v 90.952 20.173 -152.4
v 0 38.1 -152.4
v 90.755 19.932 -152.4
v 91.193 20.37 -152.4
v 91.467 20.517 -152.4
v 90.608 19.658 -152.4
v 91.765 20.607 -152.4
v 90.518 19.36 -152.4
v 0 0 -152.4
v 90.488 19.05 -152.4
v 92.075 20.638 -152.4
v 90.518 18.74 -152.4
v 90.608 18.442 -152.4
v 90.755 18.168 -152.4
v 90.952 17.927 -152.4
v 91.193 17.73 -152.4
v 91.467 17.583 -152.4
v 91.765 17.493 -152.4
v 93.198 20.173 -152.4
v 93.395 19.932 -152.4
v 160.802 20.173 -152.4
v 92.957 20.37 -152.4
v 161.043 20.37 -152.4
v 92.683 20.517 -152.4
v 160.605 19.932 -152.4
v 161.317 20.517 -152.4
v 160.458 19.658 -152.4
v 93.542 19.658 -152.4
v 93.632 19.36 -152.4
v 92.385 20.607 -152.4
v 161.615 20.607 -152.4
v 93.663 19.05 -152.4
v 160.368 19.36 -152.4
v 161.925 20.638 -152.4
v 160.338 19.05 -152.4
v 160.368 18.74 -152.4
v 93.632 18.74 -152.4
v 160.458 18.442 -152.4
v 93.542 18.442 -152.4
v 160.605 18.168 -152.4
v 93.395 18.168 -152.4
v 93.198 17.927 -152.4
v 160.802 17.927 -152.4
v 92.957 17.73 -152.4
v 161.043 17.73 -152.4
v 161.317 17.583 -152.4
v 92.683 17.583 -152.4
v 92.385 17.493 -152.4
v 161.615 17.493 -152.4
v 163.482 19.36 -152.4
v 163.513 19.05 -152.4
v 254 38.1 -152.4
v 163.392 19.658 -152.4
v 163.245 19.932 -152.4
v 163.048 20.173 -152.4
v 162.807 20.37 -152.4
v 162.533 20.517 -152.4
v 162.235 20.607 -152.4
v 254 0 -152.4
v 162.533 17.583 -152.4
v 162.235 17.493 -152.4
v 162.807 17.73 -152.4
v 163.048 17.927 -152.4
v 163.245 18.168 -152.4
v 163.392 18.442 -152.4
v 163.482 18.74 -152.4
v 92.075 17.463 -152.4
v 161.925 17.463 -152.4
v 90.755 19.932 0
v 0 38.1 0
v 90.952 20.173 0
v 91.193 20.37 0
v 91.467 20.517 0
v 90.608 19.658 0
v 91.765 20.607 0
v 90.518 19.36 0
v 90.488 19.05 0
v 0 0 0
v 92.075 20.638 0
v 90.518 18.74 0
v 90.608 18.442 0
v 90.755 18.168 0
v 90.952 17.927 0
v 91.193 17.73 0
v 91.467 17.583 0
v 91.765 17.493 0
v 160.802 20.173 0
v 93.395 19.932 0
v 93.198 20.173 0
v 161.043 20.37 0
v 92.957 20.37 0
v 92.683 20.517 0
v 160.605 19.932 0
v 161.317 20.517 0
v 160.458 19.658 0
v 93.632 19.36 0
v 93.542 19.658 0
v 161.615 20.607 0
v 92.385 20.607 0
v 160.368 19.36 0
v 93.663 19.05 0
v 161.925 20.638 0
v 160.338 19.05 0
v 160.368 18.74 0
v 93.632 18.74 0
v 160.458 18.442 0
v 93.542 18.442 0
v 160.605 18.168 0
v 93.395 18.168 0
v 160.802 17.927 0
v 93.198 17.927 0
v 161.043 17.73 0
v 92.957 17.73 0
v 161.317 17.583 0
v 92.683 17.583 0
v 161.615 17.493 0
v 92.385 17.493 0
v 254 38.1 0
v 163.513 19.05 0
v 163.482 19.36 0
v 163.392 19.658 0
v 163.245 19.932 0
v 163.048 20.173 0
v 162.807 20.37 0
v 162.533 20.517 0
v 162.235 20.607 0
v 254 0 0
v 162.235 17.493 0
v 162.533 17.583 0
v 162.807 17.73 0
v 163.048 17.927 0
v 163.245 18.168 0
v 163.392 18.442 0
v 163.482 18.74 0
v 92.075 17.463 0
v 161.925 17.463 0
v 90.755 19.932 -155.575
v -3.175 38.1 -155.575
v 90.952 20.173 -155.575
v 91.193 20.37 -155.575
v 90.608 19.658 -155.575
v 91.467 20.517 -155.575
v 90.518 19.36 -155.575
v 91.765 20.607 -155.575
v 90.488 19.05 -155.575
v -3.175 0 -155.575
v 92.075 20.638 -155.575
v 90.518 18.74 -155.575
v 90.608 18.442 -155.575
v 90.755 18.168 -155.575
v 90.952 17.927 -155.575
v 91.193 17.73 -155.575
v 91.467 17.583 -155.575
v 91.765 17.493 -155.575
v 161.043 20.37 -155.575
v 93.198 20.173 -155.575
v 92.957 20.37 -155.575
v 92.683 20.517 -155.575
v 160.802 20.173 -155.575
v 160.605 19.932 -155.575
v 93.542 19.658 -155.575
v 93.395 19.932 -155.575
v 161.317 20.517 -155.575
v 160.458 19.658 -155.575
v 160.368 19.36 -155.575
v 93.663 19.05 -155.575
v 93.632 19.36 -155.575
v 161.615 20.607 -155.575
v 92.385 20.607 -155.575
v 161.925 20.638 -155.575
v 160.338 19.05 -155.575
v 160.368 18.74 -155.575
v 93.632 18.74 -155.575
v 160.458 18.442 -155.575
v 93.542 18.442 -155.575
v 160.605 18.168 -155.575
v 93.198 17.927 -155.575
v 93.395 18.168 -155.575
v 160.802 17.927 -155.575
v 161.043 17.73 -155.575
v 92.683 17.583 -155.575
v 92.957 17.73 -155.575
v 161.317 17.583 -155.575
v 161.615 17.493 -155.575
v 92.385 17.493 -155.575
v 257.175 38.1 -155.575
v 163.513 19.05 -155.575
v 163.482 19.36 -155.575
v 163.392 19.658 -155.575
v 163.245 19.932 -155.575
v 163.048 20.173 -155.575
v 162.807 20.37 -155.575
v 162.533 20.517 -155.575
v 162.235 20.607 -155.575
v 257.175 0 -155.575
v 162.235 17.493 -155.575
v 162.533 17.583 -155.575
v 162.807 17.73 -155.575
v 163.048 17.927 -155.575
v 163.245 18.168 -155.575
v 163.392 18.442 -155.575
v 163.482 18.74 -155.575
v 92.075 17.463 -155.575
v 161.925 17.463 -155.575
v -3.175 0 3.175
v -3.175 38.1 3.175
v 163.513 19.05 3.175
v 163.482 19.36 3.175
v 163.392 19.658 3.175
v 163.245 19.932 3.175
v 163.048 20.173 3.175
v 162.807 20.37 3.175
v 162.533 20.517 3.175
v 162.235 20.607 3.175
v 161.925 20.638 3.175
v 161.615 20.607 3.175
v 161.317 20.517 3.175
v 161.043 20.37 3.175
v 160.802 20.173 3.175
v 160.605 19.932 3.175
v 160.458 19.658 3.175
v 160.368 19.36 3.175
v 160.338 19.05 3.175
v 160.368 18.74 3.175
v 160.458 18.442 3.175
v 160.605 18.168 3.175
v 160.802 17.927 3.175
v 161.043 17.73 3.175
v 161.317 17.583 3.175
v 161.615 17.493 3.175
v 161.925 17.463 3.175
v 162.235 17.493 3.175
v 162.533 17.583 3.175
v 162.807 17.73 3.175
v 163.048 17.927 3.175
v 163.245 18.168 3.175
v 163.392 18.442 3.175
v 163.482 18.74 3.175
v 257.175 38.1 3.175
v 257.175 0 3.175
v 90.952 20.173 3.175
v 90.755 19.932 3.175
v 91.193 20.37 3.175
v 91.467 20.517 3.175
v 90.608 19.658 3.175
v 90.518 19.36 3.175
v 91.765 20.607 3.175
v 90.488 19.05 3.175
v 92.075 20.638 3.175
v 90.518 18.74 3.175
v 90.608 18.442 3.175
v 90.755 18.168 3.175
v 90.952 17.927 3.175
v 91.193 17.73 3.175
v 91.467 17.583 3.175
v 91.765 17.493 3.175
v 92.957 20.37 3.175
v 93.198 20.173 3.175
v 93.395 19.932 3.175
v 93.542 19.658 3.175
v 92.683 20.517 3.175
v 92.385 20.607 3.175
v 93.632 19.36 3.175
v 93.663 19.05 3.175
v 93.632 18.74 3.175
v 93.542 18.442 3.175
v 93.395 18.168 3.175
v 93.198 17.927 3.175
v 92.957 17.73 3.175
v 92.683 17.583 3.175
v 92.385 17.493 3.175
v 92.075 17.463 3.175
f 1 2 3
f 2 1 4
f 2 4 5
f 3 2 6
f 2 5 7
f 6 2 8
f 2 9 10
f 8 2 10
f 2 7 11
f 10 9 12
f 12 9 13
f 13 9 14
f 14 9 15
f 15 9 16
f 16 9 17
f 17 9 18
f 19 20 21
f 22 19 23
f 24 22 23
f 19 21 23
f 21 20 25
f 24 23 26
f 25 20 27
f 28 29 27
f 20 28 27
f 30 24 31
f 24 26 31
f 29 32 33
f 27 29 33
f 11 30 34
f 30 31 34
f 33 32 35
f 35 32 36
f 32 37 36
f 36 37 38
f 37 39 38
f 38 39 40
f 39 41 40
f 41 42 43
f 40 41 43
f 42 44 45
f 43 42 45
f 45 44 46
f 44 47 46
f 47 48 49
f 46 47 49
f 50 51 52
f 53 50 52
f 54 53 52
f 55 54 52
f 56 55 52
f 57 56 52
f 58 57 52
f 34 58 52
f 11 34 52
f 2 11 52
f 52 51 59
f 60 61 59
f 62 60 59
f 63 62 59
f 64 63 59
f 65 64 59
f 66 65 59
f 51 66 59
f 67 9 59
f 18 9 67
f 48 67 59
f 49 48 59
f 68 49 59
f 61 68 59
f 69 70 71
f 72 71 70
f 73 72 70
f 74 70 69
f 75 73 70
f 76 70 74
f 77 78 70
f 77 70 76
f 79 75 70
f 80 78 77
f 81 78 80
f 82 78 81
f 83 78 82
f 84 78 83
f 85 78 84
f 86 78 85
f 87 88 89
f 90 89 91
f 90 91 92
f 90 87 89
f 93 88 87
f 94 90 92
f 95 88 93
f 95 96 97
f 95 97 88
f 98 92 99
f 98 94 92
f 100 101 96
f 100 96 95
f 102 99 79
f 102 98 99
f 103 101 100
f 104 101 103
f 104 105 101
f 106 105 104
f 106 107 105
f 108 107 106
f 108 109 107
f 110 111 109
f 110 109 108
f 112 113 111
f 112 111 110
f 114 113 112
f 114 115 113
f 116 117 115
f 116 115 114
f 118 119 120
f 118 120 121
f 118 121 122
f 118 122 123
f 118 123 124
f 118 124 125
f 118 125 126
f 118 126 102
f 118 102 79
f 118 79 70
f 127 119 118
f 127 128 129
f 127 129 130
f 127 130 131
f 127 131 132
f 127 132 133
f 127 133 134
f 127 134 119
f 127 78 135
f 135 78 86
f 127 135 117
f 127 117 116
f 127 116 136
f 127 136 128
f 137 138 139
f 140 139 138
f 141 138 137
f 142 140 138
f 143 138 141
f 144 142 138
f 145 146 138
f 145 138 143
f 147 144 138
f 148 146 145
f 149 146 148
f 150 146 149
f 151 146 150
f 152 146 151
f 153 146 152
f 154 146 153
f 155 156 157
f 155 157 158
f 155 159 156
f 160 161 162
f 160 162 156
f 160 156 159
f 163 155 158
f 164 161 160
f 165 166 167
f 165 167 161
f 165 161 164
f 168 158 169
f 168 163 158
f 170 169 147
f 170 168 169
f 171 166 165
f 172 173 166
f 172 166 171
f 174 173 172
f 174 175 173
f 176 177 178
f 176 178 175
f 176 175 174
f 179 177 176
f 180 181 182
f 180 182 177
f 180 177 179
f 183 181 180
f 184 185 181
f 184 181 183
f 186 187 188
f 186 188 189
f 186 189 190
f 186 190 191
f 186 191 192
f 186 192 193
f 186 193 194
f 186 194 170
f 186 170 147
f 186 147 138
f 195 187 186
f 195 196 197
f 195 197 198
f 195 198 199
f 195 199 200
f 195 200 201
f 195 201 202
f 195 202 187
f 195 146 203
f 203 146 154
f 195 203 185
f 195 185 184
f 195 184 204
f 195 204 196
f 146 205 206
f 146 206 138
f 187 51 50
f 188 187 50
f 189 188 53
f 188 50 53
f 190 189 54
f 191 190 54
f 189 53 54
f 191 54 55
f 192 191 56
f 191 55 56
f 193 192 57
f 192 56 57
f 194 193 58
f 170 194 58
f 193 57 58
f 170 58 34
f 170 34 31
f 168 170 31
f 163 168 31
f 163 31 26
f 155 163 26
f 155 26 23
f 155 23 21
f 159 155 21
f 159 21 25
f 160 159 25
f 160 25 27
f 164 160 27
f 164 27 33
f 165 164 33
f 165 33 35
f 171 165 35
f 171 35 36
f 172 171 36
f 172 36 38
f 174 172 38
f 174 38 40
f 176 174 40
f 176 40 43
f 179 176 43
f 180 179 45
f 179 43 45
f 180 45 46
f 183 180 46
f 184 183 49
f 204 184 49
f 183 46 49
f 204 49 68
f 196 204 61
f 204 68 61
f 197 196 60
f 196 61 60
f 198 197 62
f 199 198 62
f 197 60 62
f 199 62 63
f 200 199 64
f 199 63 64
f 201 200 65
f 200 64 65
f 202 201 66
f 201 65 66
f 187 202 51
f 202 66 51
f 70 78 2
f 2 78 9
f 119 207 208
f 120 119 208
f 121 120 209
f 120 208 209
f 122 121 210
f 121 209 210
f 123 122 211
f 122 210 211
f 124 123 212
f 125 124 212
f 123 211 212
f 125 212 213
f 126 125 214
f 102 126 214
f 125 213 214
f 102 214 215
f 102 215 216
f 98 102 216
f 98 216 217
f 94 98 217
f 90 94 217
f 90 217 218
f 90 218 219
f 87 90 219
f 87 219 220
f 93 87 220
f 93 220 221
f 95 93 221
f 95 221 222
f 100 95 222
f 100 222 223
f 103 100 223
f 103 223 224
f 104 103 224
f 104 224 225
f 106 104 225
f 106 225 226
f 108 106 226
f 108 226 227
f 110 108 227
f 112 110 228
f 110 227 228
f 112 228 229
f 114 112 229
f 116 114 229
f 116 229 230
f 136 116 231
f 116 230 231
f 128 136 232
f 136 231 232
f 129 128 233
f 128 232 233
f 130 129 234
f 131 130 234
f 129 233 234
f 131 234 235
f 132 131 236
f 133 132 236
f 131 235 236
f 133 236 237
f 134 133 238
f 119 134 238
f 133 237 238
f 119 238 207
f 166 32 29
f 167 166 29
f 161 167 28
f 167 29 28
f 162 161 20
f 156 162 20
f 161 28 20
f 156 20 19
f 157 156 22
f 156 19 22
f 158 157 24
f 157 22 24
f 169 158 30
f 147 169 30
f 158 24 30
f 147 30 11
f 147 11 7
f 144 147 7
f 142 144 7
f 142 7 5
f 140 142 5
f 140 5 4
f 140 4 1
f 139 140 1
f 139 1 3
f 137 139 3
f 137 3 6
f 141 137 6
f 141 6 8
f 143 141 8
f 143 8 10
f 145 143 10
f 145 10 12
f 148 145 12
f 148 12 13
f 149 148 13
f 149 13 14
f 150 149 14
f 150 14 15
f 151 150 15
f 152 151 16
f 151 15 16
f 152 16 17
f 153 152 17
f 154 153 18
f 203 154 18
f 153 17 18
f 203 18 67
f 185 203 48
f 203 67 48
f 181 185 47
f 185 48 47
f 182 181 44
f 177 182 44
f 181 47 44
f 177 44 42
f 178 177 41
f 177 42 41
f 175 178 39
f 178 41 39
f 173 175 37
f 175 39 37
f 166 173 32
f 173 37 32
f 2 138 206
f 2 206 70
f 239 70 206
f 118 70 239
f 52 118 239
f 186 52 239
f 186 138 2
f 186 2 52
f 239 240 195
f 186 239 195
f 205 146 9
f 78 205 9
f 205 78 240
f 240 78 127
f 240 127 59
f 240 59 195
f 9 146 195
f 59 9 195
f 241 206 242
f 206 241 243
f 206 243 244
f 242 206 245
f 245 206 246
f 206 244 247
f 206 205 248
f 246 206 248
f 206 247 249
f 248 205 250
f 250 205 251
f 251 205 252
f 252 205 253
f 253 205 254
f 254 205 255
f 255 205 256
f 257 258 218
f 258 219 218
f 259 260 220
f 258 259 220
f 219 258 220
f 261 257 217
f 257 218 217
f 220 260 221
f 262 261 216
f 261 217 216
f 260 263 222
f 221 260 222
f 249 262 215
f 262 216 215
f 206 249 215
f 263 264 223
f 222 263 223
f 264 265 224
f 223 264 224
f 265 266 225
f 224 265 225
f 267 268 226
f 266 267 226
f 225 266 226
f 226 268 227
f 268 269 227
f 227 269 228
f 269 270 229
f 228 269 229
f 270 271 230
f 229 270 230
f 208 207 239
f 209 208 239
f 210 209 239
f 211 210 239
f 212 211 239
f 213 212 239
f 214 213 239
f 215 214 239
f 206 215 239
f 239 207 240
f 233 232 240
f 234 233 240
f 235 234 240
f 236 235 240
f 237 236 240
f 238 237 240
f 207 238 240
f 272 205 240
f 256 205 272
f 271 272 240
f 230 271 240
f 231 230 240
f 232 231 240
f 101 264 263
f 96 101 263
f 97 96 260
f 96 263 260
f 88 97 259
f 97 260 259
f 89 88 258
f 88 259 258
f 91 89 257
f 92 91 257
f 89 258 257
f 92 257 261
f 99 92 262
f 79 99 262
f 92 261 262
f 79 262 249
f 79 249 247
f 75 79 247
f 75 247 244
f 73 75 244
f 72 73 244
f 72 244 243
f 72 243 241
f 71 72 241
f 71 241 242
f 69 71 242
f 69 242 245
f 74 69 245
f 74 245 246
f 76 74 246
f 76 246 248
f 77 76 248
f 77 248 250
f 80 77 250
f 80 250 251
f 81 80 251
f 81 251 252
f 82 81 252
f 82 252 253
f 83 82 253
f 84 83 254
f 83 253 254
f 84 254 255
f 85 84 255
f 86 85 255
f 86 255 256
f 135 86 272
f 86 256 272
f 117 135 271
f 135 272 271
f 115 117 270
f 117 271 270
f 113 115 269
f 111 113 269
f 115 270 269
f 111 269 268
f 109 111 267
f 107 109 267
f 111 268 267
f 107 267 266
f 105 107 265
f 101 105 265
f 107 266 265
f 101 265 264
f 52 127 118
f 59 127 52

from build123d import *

# Parameters (mm, degrees)
SKETCH4_W           = 260.35
SKETCH4_H           = 158.75
SKETCH4_W_2         = 254
SKETCH4_H_2         = 152.4
BOSS_EXTRUDE1_DEPTH = 38.1
SKETCH5_R           = 1.5875
CUT_EXTRUDE1_DEPTH  = 305.618044648
SKETCH5_4_R         = 1.5875
CUT_EXTRUDE2_DEPTH  = 305.618044648


with BuildPart() as part:
    # Sketch4 → Boss-Extrude1 (new body)
    with BuildSketch(Plane(origin=(0, 0, 0), x_dir=(1, 0, 0), z_dir=(0, 1, 0))):
        with Locations((127, 76.2)):
            Rectangle(SKETCH4_W, SKETCH4_H)
        with Locations((127, 76.2)):
            Rectangle(SKETCH4_W_2, SKETCH4_H_2, mode=Mode.SUBTRACT)
    extrude(amount=BOSS_EXTRUDE1_DEPTH)

    # Sketch5 → Cut-Extrude1 (cut, through all)
    with BuildSketch(Plane.XY.offset(3.175)):
        with Locations((92.075, 19.05)):
            Circle(SKETCH5_R)
    extrude(amount=-CUT_EXTRUDE1_DEPTH, mode=Mode.SUBTRACT)

    # Sketch5<4> → Cut-Extrude2 (cut, through all)
    with BuildSketch(Plane.XY.offset(3.175)):
        with Locations((161.925, 19.05)):
            Circle(SKETCH5_4_R)
    extrude(amount=-CUT_EXTRUDE2_DEPTH, mode=Mode.SUBTRACT)


solid = part.part
